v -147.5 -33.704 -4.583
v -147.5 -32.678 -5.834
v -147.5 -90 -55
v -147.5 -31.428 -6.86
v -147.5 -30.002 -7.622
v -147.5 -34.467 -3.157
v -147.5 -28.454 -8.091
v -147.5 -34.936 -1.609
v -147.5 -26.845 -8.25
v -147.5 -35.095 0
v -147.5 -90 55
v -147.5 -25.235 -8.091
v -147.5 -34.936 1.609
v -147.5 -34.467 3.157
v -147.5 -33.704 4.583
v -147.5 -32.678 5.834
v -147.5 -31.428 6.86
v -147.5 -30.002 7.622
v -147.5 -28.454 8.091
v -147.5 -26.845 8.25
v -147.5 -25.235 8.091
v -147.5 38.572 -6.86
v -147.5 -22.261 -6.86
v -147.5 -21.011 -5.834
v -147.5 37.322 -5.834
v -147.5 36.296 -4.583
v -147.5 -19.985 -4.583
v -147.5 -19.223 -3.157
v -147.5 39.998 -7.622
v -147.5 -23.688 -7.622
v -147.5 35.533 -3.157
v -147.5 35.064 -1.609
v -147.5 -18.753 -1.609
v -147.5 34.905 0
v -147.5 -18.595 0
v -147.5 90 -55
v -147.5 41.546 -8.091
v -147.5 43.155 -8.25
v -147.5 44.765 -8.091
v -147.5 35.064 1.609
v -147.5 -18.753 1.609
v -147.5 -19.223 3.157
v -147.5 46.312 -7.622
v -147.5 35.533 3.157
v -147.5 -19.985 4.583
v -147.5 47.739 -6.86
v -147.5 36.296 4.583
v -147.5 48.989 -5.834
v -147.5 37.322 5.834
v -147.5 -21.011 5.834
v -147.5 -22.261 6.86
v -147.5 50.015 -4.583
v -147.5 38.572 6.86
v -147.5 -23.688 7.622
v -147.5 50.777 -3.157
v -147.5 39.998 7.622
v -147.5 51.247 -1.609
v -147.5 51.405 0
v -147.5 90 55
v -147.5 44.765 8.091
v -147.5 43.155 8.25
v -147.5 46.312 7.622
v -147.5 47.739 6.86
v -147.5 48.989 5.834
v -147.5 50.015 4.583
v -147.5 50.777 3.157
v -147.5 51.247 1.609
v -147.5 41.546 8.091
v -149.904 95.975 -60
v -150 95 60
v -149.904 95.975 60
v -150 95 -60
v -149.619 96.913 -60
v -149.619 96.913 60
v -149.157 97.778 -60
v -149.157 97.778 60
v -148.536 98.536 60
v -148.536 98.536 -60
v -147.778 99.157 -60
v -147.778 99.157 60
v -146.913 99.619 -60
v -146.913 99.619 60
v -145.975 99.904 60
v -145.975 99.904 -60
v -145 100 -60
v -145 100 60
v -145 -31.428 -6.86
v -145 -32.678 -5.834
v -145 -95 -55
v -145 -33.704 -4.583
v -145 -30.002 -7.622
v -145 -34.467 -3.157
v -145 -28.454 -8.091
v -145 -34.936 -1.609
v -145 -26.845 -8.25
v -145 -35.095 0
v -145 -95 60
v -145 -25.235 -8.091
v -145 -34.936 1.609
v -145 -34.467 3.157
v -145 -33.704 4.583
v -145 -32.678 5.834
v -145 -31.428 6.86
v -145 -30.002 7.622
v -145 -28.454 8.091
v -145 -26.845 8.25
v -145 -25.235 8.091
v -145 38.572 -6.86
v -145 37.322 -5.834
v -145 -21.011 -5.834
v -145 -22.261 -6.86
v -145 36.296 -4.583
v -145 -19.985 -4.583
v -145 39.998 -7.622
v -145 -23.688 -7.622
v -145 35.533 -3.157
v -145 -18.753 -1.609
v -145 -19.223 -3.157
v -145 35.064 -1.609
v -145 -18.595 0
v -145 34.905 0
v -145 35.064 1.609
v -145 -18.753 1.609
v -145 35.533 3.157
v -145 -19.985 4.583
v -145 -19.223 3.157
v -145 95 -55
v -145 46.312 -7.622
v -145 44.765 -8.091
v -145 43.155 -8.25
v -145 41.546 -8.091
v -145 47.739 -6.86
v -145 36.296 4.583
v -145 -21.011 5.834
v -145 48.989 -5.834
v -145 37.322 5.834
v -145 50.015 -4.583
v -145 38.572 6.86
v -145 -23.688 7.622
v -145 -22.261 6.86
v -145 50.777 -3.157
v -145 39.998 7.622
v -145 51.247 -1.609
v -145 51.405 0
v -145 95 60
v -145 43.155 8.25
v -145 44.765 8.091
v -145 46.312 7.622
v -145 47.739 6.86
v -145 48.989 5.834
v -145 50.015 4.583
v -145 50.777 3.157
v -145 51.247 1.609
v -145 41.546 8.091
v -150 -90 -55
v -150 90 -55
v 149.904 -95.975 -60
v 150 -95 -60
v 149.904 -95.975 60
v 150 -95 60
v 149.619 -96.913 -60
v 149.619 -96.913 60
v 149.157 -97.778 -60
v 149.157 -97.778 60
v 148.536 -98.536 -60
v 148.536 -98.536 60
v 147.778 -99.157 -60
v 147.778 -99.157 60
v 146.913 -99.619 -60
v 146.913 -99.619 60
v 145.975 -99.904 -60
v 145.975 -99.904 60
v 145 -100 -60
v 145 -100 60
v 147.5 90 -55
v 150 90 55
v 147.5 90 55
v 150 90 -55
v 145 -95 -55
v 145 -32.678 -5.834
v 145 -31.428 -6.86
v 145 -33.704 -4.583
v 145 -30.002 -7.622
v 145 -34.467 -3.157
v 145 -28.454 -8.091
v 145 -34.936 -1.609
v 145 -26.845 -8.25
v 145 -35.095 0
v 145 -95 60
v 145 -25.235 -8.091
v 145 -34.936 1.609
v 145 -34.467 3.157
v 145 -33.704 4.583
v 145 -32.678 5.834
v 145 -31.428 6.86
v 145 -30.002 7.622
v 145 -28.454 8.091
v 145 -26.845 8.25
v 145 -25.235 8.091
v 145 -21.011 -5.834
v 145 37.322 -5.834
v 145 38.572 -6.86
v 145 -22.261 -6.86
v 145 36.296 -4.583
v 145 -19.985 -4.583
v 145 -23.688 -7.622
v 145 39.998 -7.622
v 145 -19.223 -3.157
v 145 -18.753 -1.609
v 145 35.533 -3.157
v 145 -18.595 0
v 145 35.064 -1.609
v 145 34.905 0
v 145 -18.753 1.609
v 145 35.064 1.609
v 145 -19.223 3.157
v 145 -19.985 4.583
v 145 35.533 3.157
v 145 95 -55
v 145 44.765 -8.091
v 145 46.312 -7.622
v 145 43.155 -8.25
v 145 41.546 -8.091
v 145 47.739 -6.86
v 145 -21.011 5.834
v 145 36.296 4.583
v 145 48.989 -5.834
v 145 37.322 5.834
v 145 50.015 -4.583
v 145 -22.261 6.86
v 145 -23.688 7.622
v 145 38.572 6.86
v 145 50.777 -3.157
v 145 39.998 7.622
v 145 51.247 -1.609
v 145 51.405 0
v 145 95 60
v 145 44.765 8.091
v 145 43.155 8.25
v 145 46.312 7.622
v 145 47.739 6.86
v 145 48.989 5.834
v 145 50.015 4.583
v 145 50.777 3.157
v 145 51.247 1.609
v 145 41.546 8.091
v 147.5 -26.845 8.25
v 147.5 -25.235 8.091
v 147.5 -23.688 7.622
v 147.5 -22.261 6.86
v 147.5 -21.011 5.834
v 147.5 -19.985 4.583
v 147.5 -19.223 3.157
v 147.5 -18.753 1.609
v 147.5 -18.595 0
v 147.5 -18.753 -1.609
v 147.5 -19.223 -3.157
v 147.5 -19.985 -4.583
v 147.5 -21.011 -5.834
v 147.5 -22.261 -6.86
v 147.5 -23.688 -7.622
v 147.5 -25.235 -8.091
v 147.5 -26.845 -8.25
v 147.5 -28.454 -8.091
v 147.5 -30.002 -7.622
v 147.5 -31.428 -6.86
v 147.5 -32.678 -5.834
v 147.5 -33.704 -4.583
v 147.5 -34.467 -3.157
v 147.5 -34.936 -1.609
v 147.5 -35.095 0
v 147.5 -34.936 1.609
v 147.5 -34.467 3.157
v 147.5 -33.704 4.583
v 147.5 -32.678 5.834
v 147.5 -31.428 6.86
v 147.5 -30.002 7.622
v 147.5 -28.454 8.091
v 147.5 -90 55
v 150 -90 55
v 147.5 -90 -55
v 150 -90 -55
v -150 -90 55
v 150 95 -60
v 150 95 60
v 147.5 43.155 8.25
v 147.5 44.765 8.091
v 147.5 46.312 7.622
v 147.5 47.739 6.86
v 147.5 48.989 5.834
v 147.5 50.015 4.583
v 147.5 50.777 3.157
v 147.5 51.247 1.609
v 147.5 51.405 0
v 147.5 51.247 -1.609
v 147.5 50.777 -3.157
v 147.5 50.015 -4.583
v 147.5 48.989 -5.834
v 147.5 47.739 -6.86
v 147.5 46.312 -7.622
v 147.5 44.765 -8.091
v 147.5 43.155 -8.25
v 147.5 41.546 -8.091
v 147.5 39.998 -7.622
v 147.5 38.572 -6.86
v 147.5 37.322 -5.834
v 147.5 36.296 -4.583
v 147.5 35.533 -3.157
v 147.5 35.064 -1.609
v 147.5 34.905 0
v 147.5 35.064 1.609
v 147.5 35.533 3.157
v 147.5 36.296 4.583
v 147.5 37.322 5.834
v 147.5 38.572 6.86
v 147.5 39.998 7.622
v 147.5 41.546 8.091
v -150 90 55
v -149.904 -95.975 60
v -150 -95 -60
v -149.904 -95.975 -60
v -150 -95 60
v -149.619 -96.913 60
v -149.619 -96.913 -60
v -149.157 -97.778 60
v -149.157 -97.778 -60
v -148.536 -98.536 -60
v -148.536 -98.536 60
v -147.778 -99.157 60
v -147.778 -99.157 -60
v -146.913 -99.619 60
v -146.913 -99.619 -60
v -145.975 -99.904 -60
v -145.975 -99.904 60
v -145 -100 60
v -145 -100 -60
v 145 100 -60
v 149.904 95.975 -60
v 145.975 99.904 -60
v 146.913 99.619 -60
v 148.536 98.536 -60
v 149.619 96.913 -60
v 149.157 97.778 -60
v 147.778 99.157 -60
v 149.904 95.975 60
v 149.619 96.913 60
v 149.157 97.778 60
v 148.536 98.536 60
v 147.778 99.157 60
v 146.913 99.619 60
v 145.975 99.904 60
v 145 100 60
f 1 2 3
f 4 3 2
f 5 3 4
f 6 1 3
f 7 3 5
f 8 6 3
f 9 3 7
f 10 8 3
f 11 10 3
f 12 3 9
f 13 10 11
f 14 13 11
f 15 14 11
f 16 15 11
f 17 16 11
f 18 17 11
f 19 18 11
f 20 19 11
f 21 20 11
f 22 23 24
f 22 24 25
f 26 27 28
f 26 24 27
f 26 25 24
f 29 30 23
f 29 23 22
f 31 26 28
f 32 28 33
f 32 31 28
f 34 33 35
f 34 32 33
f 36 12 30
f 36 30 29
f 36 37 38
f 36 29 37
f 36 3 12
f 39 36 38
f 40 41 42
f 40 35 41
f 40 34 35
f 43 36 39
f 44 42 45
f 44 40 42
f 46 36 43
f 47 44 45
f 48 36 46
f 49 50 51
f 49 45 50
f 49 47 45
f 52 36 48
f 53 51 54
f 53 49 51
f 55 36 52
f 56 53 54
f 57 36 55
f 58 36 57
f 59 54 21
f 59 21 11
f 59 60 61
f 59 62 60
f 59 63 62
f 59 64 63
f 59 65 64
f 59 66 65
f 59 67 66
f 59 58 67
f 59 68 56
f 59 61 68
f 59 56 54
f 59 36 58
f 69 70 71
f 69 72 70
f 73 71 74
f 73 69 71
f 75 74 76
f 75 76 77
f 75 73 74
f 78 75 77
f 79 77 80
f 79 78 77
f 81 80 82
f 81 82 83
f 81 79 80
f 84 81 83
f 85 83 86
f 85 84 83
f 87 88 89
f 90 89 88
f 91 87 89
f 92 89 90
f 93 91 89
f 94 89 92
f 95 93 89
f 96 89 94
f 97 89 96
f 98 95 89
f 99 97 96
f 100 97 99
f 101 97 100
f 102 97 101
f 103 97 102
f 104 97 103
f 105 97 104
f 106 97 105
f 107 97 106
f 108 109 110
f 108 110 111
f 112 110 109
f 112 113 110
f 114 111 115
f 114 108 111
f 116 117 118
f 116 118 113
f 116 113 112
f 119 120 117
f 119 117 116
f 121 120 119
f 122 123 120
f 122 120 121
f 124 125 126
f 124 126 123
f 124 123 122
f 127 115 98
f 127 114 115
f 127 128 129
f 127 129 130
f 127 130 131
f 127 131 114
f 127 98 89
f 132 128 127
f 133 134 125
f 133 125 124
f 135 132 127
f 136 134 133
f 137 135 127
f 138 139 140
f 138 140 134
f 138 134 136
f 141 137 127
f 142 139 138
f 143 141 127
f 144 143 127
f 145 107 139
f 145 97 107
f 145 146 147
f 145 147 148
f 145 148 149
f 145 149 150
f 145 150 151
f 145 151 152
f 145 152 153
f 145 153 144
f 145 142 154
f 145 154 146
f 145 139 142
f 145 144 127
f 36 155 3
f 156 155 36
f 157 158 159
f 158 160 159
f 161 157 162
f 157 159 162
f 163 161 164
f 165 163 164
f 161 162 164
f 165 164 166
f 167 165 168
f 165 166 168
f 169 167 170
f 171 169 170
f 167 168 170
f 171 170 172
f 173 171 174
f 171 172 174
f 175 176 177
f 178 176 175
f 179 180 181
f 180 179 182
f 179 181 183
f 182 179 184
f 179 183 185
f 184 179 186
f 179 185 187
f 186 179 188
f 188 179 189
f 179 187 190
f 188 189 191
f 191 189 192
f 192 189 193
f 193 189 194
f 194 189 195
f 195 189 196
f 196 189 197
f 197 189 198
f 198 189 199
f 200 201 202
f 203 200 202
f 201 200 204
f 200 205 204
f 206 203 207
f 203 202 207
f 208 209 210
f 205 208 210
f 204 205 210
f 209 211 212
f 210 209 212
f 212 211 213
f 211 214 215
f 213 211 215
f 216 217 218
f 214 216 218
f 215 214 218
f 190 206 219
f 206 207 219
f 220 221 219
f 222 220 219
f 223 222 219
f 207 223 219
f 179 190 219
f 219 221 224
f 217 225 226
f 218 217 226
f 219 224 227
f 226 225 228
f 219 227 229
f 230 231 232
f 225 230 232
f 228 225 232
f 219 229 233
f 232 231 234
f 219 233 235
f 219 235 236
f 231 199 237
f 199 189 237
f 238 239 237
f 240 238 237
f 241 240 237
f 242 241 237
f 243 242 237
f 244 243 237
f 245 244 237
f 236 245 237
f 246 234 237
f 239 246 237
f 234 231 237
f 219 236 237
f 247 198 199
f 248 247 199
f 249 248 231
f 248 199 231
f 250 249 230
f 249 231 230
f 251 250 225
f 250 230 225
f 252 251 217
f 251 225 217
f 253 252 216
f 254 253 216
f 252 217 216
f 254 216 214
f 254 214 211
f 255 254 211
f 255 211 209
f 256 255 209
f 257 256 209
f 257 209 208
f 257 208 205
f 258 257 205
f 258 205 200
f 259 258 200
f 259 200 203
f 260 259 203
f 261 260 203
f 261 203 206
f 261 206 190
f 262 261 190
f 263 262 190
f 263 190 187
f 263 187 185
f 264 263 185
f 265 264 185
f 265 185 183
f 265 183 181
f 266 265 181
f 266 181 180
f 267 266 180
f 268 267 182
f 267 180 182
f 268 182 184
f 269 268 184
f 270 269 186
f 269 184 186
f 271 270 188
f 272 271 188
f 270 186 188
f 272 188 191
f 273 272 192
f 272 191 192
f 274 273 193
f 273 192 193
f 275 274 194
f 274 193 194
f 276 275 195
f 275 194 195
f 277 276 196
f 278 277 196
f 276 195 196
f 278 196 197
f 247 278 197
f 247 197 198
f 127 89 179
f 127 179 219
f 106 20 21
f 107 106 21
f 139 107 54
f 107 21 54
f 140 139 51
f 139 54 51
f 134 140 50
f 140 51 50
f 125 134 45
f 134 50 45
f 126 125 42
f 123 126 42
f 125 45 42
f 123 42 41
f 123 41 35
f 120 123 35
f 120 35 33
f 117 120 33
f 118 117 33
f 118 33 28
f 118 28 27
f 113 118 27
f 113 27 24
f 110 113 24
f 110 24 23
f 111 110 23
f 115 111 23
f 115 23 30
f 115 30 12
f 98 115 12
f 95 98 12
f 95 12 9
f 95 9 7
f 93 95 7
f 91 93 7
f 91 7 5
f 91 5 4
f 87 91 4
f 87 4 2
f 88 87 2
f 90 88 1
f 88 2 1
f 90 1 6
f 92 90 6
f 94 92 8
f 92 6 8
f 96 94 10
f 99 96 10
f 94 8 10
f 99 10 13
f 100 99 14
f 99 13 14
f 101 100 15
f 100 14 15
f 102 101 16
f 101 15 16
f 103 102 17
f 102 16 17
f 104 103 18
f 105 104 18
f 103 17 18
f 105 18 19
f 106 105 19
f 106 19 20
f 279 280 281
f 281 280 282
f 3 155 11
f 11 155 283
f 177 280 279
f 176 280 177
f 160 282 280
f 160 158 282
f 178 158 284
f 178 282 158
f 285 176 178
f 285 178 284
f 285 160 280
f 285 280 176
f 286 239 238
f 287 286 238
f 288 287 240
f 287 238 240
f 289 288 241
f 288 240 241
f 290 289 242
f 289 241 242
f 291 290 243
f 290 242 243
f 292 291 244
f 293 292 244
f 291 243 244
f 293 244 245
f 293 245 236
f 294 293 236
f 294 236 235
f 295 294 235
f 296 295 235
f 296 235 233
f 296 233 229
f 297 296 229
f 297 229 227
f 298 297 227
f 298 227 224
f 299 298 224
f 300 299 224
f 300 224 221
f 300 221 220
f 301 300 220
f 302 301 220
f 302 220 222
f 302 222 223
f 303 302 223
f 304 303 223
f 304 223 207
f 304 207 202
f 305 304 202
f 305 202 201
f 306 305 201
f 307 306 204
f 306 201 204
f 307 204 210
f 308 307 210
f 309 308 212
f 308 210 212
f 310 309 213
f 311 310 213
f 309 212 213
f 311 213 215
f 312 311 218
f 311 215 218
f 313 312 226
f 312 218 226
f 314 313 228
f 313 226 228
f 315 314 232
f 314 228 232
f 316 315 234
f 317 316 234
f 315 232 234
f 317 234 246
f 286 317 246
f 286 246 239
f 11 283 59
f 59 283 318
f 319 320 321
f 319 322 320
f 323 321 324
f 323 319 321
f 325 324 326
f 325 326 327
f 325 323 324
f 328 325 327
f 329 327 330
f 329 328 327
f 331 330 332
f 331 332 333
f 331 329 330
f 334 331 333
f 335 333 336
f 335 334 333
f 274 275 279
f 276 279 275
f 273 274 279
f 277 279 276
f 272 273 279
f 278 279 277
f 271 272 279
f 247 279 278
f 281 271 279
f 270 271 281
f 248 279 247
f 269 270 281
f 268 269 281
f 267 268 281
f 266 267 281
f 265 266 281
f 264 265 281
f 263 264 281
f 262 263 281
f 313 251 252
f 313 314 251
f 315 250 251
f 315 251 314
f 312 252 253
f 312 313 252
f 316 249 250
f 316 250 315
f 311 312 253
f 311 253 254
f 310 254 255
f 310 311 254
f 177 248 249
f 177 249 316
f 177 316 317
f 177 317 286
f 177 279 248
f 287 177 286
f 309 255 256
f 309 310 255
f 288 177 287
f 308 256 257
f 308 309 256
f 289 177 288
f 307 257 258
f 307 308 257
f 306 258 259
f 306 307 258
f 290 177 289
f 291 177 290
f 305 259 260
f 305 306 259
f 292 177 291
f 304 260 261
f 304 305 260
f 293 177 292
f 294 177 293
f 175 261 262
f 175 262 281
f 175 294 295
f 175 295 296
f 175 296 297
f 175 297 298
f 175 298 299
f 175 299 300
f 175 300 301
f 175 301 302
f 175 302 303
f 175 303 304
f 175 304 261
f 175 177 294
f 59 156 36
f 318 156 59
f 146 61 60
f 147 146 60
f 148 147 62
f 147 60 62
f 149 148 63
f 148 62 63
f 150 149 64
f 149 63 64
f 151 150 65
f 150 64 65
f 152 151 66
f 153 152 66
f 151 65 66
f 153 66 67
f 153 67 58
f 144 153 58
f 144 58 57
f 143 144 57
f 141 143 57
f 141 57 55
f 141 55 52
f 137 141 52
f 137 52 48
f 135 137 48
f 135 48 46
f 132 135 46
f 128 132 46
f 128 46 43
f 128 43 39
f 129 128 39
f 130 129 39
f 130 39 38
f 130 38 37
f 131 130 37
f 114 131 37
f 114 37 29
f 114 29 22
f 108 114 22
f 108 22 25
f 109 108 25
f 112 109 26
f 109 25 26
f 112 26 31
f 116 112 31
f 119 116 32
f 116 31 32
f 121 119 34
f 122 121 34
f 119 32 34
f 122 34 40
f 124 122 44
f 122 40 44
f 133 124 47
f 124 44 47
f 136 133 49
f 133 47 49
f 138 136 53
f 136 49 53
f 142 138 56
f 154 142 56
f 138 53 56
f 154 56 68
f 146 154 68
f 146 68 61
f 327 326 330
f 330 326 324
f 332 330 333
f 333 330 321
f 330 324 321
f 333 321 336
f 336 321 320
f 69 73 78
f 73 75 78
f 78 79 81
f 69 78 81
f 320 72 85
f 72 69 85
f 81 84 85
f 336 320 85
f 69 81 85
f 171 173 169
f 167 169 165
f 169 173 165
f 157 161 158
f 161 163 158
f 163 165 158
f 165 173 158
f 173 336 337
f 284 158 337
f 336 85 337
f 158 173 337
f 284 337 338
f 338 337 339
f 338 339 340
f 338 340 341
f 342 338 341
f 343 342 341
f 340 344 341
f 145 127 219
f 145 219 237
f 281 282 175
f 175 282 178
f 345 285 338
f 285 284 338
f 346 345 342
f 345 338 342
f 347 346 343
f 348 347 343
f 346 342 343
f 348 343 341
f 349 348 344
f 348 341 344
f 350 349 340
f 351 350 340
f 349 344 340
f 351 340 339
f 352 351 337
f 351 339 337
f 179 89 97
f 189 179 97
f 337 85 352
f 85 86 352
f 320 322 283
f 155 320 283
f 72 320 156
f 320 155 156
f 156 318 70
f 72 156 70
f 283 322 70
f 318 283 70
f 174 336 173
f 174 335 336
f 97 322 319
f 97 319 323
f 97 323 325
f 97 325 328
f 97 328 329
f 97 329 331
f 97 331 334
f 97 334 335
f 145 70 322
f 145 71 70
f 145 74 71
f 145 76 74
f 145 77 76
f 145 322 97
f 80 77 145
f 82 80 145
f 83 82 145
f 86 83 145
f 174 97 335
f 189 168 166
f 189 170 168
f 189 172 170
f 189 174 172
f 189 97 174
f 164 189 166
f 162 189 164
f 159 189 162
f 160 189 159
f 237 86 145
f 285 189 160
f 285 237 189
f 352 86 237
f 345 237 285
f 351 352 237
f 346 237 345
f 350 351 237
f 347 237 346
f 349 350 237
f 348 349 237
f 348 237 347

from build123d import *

# Parameters (mm, degrees)
SKETCH1_W           = 300
SKETCH1_H           = 200
BOSS_EXTRUDE1_DEPTH = 60
FILLET1_R           = 5
SHELL1_START        = -145
SHELL1_OUTLINE_W    = 190
SHELL1_OUTLINE_H    = 115
SHELL1_DEPTH        = 290
SKETCH5_W           = 110
SKETCH5_H           = 180
CUT_EXTRUDE1_DEPTH  = 2.5
SKETCH6_W           = 110
SKETCH6_H           = 180
CUT_EXTRUDE2_DEPTH  = 2.5
SKETCH7_R           = 8.25
CUT_EXTRUDE3_DEPTH  = 320.540685985


# Read off the part's stored shape, not the designer's step: Shell1
with BuildPart() as part:
    # Sketch1 → Boss-Extrude1 (new, symmetric)
    with BuildSketch(Plane.XY):
        Rectangle(SKETCH1_W, SKETCH1_H)
    extrude(amount=BOSS_EXTRUDE1_DEPTH, both=True)

    # Fillet1
    fillet1_edges = [part.edges().sort_by_distance(p)[0] for p in [
        (150, -100, 0),
        (-150, -100, 0),
        (-150, 100, 0),
        (150, 100, 0),
    ]]
    fillet(fillet1_edges, radius=FILLET1_R)

    # Shell1 outline → Shell1 (cut)
    with BuildSketch(Plane.YZ.offset(SHELL1_START)):
        with Locations((0, 2.5)):
            Rectangle(SHELL1_OUTLINE_W, SHELL1_OUTLINE_H)
    extrude(amount=SHELL1_DEPTH, mode=Mode.SUBTRACT)

    # Sketch5 → Cut-Extrude1 (cut)
    with BuildSketch(Plane(origin=(150, 0, 0), x_dir=(0, 0, -1), z_dir=(1, 0, 0))):
        Rectangle(SKETCH5_W, SKETCH5_H)
    extrude(amount=-CUT_EXTRUDE1_DEPTH, mode=Mode.SUBTRACT)

    # Sketch6 → Cut-Extrude2 (cut)
    with BuildSketch(Plane.ZY.offset(150)):
        Rectangle(SKETCH6_W, SKETCH6_H)
    extrude(amount=-CUT_EXTRUDE2_DEPTH, mode=Mode.SUBTRACT)

    # Sketch7 → Cut-Extrude3 (cut, through all)
    with BuildSketch(Plane.ZY.offset(147.5)):
        with Locations((0, 43.15529971)):
            Circle(SKETCH7_R)
        with Locations((0, -26.84470029)):
            Circle(SKETCH7_R)
    extrude(amount=-CUT_EXTRUDE3_DEPTH, mode=Mode.SUBTRACT)


solid = part.part
